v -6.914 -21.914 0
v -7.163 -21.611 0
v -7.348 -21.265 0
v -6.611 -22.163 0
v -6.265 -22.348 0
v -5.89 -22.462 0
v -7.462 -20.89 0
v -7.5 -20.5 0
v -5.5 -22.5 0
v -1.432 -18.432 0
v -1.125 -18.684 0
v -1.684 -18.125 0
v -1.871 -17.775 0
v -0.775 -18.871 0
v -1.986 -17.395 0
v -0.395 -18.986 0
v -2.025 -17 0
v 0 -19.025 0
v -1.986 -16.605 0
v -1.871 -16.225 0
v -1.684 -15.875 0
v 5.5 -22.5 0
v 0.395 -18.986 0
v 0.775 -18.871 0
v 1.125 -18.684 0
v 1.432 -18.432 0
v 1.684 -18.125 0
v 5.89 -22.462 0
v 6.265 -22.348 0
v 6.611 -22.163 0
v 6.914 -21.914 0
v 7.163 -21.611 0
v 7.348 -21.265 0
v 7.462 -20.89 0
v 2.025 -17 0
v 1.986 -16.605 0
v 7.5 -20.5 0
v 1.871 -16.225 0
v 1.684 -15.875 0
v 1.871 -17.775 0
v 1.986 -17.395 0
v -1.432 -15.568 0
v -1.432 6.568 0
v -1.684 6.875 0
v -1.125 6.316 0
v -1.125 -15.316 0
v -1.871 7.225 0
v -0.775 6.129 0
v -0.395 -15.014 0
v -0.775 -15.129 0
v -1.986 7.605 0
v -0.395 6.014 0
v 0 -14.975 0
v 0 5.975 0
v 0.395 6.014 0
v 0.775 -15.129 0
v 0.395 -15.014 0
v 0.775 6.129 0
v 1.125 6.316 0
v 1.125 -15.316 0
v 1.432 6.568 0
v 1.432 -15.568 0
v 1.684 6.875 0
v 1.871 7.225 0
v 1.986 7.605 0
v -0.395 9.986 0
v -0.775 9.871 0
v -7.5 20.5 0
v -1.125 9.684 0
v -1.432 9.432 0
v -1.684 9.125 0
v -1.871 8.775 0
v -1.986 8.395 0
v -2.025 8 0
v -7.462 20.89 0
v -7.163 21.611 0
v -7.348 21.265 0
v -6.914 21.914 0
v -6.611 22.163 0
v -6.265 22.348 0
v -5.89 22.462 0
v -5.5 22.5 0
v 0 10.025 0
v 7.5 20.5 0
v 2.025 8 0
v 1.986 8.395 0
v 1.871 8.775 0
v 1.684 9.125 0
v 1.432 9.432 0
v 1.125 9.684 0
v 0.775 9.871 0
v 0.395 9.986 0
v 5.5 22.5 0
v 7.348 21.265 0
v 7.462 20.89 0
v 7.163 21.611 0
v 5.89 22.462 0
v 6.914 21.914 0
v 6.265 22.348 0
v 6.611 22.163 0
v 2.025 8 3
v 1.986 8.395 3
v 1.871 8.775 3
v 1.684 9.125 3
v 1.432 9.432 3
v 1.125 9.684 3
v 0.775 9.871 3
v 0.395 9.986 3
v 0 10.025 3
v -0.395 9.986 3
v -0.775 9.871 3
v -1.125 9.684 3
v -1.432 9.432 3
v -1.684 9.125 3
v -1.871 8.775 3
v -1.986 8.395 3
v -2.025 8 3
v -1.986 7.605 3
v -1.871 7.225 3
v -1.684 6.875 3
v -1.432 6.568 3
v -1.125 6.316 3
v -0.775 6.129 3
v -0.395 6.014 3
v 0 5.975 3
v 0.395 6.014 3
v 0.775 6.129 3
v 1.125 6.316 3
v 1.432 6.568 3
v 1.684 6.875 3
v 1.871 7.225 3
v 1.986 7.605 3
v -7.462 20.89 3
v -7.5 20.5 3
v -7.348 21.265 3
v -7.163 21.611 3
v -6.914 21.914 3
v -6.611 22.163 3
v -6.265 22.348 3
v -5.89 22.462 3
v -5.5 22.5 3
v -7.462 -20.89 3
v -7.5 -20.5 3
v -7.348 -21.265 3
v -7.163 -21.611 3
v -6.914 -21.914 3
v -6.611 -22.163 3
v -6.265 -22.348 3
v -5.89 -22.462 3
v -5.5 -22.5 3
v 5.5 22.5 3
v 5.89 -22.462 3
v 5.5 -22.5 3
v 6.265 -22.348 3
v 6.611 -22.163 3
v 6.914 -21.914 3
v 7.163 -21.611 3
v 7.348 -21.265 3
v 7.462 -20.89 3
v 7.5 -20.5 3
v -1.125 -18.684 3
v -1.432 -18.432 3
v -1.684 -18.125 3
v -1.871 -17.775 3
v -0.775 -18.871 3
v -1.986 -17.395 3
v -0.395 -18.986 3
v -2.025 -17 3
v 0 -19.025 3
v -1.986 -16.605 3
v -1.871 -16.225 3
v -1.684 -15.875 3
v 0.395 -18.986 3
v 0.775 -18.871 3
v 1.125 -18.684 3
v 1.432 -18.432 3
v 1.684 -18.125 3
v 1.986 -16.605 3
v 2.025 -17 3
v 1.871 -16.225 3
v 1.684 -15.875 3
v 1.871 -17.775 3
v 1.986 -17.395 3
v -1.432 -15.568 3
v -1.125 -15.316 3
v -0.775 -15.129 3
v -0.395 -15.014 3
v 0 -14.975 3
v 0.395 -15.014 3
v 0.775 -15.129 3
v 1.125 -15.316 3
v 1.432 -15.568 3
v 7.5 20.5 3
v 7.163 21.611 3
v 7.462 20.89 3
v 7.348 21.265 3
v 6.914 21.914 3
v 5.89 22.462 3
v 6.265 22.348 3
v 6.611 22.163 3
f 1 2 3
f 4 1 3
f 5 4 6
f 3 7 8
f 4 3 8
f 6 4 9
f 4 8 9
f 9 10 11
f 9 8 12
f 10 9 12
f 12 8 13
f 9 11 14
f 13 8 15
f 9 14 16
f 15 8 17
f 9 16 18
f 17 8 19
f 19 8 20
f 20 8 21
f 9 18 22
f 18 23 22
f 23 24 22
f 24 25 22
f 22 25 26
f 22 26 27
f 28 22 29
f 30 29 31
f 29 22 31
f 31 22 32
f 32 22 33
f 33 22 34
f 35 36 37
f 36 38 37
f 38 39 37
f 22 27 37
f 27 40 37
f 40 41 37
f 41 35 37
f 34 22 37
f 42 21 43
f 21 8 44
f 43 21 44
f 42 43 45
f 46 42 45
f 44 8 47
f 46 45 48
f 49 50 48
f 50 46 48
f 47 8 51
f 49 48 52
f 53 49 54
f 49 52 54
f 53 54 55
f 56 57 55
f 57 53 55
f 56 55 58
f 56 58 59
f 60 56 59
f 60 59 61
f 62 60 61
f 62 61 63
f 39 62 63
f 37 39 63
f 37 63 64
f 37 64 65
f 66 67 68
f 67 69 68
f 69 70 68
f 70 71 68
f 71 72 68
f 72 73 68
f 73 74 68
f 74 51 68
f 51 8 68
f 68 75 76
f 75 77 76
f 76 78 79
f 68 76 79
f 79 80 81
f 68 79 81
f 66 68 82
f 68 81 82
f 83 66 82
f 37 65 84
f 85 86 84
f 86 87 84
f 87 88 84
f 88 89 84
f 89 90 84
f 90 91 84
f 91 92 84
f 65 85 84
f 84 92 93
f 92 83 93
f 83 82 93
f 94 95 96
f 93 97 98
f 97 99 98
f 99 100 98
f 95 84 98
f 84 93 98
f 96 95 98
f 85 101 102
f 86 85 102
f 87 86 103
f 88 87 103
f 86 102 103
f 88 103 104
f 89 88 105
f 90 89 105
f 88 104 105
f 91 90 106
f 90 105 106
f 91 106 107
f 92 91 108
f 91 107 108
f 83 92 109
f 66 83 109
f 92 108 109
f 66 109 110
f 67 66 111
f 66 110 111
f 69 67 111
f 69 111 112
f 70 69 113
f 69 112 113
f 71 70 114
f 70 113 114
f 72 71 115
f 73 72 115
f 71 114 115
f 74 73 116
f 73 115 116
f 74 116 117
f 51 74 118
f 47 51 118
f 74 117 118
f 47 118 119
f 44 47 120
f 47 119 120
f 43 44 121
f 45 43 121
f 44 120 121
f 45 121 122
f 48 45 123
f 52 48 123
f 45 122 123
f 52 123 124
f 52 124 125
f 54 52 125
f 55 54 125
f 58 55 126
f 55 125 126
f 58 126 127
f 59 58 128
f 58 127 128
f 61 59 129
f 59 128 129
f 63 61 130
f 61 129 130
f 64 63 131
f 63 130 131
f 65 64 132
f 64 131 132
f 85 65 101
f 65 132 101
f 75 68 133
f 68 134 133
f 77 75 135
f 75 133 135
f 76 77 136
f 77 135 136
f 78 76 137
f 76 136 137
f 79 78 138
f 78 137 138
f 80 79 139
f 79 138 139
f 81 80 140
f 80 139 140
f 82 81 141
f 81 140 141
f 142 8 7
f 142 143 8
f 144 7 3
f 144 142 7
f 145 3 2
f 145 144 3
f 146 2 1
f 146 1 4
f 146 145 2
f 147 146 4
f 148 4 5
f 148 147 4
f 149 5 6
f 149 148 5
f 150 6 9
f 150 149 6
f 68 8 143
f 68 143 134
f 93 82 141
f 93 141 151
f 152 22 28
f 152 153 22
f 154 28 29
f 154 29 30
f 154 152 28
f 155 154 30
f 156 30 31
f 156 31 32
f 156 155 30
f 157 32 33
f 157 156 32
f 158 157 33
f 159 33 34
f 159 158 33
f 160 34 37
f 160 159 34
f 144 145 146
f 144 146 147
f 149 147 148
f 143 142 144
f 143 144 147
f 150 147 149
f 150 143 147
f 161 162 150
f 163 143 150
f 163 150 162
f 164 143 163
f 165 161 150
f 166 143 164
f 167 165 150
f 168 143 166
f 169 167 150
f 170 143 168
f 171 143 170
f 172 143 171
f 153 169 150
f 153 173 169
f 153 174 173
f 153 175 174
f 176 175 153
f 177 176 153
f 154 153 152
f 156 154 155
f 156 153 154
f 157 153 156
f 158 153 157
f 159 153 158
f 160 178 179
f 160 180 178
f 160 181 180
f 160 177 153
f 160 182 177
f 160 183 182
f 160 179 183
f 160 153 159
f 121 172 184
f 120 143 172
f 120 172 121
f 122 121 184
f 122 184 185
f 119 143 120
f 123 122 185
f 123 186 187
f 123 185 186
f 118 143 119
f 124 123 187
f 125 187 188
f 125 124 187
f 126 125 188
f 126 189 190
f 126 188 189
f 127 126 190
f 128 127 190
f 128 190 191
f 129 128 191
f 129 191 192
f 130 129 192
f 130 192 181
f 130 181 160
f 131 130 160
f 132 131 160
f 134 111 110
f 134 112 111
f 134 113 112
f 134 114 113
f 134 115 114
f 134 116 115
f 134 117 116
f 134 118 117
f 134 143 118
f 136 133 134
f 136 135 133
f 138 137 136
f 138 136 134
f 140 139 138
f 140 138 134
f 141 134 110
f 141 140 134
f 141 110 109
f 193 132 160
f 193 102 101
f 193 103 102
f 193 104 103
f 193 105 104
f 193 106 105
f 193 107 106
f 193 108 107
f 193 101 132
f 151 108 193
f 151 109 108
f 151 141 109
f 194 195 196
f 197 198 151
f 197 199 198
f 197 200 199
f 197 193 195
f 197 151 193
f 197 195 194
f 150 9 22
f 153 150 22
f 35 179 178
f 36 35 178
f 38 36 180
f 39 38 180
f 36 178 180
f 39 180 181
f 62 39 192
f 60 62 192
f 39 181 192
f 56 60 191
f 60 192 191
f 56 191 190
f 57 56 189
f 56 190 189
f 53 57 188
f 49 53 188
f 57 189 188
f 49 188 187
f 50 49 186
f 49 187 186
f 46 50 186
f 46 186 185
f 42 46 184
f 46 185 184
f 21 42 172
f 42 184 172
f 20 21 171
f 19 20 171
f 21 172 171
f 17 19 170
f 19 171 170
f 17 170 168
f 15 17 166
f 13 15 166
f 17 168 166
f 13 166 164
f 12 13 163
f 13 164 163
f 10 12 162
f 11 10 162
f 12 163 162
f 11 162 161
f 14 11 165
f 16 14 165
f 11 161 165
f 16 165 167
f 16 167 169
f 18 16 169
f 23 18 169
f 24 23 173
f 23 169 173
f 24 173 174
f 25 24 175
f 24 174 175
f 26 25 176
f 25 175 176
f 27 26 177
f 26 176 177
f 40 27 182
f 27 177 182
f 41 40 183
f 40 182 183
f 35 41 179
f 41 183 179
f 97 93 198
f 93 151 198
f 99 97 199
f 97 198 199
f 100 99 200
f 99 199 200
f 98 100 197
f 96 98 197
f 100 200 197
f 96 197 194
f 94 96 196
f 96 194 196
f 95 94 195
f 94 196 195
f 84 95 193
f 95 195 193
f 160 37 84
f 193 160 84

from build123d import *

# Parameters (mm, degrees)
SKETCH_1_W          = 15
SKETCH_1_H          = 45
EXTRUDE_1_DEPTH     = 3
SKETCH_2_R          = 2.025
CUT_EXTRUDE_1_DEPTH = 3
FILLET_1_R          = 2


with BuildPart() as part:
    # 草图1 → 凸台-拉伸1 (new body)
    with BuildSketch(Plane.XY):
        Rectangle(SKETCH_1_W, SKETCH_1_H)
    extrude(amount=EXTRUDE_1_DEPTH)

    # 草图2 → 切除-拉伸1 (cut)
    with BuildSketch(Plane.XY.offset(3)):
        with Locations((0, -17)):
            Circle(SKETCH_2_R)
        with Locations((0, 8)):
            Circle(SKETCH_2_R)
    extrude(amount=-CUT_EXTRUDE_1_DEPTH, mode=Mode.SUBTRACT)

    # 圆角1
    fillet_1_edges = [part.edges().sort_by_distance(p)[0] for p in [
        (7.5, -22.5, 1.5),
        (-7.5, -22.5, 1.5),
        (-7.5, 22.5, 1.5),
        (7.5, 22.5, 1.5),
    ]]
    fillet(fillet_1_edges, radius=FILLET_1_R)


solid = part.part
